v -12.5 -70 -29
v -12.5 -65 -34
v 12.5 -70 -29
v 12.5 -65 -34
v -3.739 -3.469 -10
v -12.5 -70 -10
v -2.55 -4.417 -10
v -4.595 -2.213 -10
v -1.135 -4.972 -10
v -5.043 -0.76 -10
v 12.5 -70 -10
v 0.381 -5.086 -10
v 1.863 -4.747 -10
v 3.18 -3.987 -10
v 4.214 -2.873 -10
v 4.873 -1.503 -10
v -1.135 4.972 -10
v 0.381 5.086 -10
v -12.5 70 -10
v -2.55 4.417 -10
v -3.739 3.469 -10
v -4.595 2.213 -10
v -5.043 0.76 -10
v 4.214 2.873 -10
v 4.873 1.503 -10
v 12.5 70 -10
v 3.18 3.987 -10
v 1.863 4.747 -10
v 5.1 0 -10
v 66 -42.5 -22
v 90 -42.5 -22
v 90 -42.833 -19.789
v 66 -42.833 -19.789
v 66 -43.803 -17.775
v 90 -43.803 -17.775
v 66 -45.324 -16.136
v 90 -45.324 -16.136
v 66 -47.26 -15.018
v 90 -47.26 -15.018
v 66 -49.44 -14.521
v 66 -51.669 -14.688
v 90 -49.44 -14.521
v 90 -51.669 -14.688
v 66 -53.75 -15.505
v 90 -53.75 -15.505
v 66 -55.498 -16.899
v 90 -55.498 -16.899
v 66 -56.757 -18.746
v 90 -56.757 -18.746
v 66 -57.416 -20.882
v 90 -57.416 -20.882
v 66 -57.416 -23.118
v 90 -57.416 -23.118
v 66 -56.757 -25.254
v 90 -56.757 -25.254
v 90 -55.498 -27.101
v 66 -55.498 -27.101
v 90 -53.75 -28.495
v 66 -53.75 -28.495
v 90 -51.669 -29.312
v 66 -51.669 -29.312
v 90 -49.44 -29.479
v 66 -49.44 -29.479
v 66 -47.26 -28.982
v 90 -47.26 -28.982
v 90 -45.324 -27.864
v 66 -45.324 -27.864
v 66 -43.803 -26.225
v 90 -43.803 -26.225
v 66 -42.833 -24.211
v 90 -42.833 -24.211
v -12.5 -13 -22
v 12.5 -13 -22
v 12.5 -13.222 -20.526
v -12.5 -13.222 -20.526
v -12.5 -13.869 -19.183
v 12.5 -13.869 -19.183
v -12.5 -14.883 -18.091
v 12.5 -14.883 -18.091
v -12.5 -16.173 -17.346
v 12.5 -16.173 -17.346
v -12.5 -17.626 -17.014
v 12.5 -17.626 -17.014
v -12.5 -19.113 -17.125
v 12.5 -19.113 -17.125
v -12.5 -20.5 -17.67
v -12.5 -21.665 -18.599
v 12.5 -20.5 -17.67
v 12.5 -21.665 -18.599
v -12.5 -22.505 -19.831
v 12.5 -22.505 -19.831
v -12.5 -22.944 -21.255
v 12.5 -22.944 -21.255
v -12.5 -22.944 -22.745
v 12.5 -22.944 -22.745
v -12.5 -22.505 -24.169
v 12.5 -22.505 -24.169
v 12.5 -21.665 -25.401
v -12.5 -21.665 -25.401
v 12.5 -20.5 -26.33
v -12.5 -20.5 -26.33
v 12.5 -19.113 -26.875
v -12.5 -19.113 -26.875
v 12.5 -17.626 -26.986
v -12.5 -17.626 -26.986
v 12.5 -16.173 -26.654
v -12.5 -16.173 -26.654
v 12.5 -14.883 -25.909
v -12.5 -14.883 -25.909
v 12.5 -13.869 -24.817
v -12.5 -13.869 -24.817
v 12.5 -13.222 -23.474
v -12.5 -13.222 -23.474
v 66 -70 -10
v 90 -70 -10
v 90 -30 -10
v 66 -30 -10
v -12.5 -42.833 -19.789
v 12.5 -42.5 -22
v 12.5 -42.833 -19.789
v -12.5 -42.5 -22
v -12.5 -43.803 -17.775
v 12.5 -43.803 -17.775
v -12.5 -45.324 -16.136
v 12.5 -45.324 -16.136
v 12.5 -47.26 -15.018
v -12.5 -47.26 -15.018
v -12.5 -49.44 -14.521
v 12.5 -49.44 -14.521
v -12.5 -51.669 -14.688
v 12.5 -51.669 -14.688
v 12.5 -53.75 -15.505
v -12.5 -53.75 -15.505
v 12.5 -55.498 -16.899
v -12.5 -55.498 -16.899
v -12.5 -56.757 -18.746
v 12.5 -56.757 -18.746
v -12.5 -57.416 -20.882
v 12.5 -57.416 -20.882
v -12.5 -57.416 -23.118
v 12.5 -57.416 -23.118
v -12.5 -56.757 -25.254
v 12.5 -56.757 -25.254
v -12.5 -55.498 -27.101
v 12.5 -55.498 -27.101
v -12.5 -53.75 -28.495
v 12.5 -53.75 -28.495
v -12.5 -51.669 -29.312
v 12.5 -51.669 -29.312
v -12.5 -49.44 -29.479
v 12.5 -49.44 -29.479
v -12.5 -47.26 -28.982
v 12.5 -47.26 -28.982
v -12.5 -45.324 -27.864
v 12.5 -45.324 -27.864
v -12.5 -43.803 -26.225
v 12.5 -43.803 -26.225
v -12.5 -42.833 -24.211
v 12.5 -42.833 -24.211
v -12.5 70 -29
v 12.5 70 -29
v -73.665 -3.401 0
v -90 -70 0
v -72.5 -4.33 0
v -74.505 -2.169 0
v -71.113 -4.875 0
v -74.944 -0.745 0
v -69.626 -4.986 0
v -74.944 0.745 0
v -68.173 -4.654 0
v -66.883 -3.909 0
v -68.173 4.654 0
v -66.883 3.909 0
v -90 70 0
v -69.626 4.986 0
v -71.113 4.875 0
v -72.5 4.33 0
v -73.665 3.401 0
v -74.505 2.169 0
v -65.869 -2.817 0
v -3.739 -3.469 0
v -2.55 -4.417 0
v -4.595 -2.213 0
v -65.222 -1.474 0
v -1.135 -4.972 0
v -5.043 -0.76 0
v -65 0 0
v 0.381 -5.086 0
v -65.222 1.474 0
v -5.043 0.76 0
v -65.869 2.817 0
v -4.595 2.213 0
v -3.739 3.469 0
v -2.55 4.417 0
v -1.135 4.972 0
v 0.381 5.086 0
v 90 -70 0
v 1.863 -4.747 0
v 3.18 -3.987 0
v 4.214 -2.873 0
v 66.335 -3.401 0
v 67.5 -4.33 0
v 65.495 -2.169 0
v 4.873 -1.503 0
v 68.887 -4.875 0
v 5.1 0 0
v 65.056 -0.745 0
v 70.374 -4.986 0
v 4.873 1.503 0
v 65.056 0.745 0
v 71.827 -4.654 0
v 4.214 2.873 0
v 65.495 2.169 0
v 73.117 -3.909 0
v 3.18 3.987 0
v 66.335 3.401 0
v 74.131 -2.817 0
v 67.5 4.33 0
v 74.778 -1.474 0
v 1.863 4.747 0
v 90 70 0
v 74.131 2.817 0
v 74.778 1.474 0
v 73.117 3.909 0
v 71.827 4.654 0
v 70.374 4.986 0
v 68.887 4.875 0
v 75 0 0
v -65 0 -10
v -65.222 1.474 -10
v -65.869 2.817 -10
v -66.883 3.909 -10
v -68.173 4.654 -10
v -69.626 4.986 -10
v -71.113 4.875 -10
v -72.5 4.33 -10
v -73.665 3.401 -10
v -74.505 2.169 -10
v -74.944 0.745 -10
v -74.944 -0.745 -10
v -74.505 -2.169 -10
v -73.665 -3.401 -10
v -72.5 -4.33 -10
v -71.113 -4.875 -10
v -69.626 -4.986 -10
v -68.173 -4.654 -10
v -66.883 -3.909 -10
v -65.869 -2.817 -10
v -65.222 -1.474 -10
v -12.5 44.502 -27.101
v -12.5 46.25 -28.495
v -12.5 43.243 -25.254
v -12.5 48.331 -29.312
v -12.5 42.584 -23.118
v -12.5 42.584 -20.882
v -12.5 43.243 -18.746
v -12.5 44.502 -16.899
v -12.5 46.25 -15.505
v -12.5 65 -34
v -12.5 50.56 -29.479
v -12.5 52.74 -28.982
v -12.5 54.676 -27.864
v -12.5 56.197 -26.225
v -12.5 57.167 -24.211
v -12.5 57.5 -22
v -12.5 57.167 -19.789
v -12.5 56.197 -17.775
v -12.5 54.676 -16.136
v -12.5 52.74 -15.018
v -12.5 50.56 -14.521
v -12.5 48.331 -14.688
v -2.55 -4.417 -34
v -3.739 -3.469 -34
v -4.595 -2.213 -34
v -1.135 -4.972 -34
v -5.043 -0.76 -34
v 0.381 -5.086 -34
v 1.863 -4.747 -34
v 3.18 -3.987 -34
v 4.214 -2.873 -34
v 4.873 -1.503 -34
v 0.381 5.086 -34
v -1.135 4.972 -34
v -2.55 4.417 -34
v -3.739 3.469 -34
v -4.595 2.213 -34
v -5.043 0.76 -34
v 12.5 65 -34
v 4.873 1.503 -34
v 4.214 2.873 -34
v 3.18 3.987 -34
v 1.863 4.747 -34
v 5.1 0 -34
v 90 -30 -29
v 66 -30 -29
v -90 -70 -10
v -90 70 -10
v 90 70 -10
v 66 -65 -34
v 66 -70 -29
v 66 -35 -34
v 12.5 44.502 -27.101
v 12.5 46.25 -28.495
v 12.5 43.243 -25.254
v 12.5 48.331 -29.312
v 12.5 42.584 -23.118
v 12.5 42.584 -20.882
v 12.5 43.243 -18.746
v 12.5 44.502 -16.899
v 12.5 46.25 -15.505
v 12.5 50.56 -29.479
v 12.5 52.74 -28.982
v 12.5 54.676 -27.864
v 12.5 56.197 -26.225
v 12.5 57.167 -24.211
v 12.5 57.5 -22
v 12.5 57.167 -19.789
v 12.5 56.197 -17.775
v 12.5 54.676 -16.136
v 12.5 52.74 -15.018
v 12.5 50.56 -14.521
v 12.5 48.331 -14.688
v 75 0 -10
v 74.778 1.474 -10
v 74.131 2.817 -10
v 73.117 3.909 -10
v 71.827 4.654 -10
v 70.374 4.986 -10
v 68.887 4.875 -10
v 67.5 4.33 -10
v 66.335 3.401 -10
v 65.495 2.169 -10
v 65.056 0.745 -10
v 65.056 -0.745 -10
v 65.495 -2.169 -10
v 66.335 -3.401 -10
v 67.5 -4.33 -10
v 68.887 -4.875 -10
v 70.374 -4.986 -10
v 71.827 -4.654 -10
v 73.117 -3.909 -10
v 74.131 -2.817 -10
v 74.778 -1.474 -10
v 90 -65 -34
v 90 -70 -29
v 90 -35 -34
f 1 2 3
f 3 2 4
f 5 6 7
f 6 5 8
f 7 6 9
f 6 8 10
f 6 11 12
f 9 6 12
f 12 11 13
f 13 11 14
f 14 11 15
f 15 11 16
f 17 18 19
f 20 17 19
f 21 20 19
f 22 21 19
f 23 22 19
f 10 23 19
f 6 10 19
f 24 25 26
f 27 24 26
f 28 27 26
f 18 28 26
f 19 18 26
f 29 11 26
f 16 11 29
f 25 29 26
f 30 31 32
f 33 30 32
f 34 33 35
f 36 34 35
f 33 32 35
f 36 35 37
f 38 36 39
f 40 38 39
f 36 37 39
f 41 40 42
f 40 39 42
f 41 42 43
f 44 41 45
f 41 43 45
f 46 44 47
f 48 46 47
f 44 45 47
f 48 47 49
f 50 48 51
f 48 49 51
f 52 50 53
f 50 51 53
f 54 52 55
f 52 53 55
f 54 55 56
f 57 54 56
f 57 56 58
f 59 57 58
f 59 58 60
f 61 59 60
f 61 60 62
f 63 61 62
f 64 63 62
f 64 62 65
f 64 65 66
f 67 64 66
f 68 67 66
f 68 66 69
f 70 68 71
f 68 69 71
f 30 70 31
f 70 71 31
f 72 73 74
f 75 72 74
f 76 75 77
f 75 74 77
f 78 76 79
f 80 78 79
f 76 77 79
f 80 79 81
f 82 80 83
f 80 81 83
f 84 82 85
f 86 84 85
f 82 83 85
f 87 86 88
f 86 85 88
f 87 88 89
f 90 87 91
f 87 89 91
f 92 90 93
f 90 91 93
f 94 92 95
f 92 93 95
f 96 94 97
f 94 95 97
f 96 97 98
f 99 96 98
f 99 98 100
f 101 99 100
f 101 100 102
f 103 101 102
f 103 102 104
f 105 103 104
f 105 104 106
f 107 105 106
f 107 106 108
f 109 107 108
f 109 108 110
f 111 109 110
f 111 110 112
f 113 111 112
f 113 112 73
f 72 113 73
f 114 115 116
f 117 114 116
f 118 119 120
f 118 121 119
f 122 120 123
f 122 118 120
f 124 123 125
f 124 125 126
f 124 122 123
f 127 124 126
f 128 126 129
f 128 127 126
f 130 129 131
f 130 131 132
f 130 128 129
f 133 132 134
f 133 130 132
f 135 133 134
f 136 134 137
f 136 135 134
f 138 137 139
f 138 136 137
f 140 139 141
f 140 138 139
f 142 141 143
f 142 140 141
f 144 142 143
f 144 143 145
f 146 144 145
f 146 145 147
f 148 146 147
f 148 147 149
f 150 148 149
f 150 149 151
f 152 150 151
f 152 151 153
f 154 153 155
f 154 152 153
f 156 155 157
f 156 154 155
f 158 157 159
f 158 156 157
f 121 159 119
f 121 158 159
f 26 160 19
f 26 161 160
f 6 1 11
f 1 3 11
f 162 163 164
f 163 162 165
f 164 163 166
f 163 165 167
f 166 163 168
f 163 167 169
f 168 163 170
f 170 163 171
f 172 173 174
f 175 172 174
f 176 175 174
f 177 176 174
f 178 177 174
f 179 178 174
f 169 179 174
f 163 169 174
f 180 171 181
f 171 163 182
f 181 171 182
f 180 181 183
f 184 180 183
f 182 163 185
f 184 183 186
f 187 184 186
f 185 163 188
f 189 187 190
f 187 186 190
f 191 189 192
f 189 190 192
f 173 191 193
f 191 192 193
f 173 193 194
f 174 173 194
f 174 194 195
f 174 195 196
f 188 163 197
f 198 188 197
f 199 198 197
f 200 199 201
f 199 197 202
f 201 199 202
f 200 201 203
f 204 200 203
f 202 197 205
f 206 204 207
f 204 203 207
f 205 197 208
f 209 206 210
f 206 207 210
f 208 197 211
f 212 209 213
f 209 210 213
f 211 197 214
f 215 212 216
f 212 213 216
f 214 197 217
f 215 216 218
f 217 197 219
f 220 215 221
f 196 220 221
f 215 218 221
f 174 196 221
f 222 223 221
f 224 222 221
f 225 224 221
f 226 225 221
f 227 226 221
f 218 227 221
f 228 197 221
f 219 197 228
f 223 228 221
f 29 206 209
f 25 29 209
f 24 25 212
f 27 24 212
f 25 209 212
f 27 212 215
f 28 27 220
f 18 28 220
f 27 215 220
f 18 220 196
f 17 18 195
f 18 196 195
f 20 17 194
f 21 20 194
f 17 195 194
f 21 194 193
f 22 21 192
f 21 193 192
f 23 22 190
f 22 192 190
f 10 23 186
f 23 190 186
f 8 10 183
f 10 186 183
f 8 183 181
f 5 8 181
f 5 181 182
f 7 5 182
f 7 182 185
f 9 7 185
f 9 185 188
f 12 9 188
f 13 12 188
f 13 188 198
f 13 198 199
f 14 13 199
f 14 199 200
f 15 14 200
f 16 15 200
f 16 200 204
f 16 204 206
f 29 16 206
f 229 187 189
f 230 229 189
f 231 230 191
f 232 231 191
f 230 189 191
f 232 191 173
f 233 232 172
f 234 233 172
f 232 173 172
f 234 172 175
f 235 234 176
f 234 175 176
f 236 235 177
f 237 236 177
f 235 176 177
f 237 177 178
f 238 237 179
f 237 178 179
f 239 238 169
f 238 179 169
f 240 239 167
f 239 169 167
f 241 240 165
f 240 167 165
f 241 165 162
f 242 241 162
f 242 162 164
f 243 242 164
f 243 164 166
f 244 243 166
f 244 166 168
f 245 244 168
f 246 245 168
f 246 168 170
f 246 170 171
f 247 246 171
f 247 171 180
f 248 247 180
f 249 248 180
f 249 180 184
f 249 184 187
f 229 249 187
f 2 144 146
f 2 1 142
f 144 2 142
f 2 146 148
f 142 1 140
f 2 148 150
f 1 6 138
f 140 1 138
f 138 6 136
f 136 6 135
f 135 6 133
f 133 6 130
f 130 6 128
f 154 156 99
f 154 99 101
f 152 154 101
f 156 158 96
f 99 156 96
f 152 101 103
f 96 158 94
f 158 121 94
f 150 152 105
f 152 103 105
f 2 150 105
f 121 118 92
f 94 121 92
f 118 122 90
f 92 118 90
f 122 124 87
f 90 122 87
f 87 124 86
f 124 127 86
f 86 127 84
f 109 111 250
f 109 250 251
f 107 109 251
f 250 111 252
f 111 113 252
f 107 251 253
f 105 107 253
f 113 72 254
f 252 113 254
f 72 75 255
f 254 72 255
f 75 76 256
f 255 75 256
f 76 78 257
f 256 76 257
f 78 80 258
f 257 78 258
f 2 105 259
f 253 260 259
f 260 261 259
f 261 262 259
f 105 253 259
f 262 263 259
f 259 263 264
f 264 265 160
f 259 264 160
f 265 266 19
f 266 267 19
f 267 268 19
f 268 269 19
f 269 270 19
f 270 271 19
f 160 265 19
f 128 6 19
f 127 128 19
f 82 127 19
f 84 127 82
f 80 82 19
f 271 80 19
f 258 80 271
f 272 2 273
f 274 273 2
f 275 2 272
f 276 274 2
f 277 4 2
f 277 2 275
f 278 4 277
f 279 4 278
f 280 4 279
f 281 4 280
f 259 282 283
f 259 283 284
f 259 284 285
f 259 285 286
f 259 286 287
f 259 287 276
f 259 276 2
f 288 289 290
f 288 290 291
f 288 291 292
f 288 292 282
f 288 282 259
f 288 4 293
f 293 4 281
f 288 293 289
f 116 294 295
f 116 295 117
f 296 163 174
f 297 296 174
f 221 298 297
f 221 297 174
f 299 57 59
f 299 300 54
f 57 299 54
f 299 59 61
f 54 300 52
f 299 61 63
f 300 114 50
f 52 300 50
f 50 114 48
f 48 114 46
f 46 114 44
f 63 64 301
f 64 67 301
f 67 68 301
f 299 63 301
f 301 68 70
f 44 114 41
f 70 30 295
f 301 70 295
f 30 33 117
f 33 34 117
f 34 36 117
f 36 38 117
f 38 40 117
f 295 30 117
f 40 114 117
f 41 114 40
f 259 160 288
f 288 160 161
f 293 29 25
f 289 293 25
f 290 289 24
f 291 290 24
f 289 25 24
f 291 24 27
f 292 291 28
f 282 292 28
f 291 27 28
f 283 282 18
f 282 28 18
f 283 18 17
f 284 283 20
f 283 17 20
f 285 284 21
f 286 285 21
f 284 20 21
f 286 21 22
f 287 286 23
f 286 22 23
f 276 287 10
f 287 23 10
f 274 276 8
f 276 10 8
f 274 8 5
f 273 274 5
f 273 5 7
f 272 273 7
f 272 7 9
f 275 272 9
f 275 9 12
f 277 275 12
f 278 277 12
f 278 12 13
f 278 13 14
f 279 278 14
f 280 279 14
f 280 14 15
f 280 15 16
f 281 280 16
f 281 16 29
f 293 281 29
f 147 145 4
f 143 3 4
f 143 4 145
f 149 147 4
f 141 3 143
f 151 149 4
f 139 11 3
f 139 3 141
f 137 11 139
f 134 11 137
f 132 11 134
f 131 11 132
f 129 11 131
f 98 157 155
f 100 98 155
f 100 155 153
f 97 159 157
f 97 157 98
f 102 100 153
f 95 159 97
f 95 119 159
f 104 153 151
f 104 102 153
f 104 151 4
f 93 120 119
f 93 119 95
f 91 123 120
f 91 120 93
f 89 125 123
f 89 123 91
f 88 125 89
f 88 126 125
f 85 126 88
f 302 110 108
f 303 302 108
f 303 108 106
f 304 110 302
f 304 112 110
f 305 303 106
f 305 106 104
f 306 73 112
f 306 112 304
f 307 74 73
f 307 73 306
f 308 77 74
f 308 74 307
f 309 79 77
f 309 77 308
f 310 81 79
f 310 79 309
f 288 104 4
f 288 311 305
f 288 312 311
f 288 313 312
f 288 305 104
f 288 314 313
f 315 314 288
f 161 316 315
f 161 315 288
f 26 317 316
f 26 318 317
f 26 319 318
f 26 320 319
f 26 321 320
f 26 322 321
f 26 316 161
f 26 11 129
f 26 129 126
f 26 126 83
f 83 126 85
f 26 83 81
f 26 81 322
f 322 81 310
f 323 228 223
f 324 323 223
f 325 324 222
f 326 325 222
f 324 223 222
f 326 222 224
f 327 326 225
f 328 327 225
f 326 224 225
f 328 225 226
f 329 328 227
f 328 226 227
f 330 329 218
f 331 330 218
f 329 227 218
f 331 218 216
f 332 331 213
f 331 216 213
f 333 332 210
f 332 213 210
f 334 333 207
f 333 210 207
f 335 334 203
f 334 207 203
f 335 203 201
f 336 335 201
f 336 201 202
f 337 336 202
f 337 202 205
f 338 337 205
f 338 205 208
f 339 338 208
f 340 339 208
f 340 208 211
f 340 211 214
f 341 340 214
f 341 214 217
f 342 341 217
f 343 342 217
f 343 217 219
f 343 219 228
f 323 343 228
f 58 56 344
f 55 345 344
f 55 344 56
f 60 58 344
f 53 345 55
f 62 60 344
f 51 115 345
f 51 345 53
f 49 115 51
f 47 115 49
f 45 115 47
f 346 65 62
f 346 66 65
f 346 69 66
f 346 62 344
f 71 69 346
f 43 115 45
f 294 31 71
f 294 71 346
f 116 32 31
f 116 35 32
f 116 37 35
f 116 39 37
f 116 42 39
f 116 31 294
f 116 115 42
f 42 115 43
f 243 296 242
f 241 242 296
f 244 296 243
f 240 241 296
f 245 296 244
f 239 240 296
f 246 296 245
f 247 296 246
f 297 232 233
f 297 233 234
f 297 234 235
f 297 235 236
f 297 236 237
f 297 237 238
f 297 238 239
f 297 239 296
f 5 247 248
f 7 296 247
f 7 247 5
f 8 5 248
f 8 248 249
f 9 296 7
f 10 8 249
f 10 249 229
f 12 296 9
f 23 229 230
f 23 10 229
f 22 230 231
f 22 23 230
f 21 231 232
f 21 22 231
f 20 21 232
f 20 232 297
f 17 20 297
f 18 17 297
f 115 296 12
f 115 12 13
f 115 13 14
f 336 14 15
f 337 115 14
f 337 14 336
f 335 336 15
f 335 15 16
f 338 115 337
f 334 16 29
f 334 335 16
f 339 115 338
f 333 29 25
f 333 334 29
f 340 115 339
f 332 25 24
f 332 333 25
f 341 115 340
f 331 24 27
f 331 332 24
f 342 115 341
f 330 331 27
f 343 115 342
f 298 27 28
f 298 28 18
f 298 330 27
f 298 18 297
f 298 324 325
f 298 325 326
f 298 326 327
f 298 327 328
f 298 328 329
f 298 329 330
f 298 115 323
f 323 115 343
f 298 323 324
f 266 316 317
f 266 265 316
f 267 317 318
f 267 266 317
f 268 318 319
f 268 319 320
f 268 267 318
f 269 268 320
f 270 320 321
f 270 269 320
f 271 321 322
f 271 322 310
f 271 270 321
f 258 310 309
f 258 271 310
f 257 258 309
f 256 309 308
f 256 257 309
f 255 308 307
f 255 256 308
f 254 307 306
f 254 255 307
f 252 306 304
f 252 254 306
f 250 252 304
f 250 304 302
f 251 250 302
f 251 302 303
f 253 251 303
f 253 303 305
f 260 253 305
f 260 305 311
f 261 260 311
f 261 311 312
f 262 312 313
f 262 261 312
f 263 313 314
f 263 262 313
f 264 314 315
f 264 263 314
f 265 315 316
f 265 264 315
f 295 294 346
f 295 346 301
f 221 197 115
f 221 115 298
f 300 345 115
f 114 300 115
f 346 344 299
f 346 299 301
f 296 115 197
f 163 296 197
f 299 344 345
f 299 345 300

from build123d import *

# Parameters (mm, degrees)
F0_W       = 140
F0_H       = 10
F1_DEPTH   = 90
F0_H_2     = 24
F0_R       = 7.5
F2_DEPTH   = 12.5
F3_R       = 5.1
F2_FACE_W  = 25
F2_FACE_H  = 140
F4_DEPTH   = 34.001
F6_W       = 40
F6_H       = 24
F6_R       = 7.5
F7_DEPTH   = 24
F8_R       = 5.1
F9_DEPTH   = 34.001
F10_R      = 5
F11_DEPTH  = 34.001
F12_SIZE   = 5
F12_2_SIZE = 5
F13_R      = 5
F14_DEPTH  = 102.501


with BuildPart() as f1:
    # F0 (on Right) → F1 (new body, symmetric)
    with BuildSketch(Plane.YZ):
        with Locations((0, -5)):
            Rectangle(F0_W, F0_H)
    extrude(amount=F1_DEPTH, both=True)


with BuildPart() as f2:
    # F0 (on Right) → F2 (new body, symmetric)
    with BuildSketch(Plane.YZ):
        with Locations((0, -22)):
            Rectangle(F0_W, F0_H_2)
        with Locations((-50, -22)):
            Circle(F0_R, mode=Mode.SUBTRACT)
        with Locations((50, -22)):
            Circle(F0_R, mode=Mode.SUBTRACT)
    extrude(amount=F2_DEPTH, both=True)


with BuildPart() as f4_tool:
    # F3 (on face) + F2_face (on face) → F4 (new body, through all)
    with BuildSketch(Plane.XY):
        Circle(F3_R)
    with BuildSketch(Plane(origin=(0, 0, -34), x_dir=(1, 0, 0), z_dir=(0, 0, -1))):
        Rectangle(F2_FACE_W, F2_FACE_H)
    extrude(amount=-F4_DEPTH, dir=(0, 0, 1))


with BuildPart() as f1_1:
    add(f1.part)

    # F4: cut by f4_tool
    add(f4_tool.part, mode=Mode.SUBTRACT)

    # F8 (on face) → F9 (cut, through all)
    with BuildSketch(Plane.XY):
        Circle(F8_R)
    extrude(amount=-F9_DEPTH, mode=Mode.SUBTRACT)

    # F10 (on face) → F11 (cut, through all)
    with BuildSketch(Plane.XY):
        with Locations((-70, 0)):
            Circle(F10_R)
        with Locations((70, 0)):
            Circle(F10_R)
    extrude(amount=-F11_DEPTH, mode=Mode.SUBTRACT)


with BuildPart() as f2_1:
    add(f2.part)

    # F4: cut by f4_tool
    add(f4_tool.part, mode=Mode.SUBTRACT)

    # F12#2
    f12_2_edges = [f2_1.edges().sort_by_distance(p)[0] for p in [
        (0, -70, -34),
        (0, 70, -34),
    ]]
    chamfer(f12_2_edges, length=F12_2_SIZE)

    # F13 (on face) → F14 (cut, through all)
    with BuildSketch(Plane.YZ.offset(12.5)):
        with Locations((-18, -22)):
            Circle(F13_R)
    extrude(amount=-F14_DEPTH, mode=Mode.SUBTRACT)


with BuildPart() as f7:
    # F6 (on offset) → F7 (new body)
    with BuildSketch(Plane.YZ.offset(90)):
        with Locations((-50, -22)):
            Rectangle(F6_W, F6_H)
        with Locations((-50, -22)):
            Circle(F6_R, mode=Mode.SUBTRACT)
    extrude(amount=-F7_DEPTH)

    # F12
    f12_edges = [f7.edges().sort_by_distance(p)[0] for p in [
        (78, -70, -34),
        (78, -30, -34),
    ]]
    chamfer(f12_edges, length=F12_SIZE)


solid = Compound([f1_1.part, f2_1.part, f7.part])
